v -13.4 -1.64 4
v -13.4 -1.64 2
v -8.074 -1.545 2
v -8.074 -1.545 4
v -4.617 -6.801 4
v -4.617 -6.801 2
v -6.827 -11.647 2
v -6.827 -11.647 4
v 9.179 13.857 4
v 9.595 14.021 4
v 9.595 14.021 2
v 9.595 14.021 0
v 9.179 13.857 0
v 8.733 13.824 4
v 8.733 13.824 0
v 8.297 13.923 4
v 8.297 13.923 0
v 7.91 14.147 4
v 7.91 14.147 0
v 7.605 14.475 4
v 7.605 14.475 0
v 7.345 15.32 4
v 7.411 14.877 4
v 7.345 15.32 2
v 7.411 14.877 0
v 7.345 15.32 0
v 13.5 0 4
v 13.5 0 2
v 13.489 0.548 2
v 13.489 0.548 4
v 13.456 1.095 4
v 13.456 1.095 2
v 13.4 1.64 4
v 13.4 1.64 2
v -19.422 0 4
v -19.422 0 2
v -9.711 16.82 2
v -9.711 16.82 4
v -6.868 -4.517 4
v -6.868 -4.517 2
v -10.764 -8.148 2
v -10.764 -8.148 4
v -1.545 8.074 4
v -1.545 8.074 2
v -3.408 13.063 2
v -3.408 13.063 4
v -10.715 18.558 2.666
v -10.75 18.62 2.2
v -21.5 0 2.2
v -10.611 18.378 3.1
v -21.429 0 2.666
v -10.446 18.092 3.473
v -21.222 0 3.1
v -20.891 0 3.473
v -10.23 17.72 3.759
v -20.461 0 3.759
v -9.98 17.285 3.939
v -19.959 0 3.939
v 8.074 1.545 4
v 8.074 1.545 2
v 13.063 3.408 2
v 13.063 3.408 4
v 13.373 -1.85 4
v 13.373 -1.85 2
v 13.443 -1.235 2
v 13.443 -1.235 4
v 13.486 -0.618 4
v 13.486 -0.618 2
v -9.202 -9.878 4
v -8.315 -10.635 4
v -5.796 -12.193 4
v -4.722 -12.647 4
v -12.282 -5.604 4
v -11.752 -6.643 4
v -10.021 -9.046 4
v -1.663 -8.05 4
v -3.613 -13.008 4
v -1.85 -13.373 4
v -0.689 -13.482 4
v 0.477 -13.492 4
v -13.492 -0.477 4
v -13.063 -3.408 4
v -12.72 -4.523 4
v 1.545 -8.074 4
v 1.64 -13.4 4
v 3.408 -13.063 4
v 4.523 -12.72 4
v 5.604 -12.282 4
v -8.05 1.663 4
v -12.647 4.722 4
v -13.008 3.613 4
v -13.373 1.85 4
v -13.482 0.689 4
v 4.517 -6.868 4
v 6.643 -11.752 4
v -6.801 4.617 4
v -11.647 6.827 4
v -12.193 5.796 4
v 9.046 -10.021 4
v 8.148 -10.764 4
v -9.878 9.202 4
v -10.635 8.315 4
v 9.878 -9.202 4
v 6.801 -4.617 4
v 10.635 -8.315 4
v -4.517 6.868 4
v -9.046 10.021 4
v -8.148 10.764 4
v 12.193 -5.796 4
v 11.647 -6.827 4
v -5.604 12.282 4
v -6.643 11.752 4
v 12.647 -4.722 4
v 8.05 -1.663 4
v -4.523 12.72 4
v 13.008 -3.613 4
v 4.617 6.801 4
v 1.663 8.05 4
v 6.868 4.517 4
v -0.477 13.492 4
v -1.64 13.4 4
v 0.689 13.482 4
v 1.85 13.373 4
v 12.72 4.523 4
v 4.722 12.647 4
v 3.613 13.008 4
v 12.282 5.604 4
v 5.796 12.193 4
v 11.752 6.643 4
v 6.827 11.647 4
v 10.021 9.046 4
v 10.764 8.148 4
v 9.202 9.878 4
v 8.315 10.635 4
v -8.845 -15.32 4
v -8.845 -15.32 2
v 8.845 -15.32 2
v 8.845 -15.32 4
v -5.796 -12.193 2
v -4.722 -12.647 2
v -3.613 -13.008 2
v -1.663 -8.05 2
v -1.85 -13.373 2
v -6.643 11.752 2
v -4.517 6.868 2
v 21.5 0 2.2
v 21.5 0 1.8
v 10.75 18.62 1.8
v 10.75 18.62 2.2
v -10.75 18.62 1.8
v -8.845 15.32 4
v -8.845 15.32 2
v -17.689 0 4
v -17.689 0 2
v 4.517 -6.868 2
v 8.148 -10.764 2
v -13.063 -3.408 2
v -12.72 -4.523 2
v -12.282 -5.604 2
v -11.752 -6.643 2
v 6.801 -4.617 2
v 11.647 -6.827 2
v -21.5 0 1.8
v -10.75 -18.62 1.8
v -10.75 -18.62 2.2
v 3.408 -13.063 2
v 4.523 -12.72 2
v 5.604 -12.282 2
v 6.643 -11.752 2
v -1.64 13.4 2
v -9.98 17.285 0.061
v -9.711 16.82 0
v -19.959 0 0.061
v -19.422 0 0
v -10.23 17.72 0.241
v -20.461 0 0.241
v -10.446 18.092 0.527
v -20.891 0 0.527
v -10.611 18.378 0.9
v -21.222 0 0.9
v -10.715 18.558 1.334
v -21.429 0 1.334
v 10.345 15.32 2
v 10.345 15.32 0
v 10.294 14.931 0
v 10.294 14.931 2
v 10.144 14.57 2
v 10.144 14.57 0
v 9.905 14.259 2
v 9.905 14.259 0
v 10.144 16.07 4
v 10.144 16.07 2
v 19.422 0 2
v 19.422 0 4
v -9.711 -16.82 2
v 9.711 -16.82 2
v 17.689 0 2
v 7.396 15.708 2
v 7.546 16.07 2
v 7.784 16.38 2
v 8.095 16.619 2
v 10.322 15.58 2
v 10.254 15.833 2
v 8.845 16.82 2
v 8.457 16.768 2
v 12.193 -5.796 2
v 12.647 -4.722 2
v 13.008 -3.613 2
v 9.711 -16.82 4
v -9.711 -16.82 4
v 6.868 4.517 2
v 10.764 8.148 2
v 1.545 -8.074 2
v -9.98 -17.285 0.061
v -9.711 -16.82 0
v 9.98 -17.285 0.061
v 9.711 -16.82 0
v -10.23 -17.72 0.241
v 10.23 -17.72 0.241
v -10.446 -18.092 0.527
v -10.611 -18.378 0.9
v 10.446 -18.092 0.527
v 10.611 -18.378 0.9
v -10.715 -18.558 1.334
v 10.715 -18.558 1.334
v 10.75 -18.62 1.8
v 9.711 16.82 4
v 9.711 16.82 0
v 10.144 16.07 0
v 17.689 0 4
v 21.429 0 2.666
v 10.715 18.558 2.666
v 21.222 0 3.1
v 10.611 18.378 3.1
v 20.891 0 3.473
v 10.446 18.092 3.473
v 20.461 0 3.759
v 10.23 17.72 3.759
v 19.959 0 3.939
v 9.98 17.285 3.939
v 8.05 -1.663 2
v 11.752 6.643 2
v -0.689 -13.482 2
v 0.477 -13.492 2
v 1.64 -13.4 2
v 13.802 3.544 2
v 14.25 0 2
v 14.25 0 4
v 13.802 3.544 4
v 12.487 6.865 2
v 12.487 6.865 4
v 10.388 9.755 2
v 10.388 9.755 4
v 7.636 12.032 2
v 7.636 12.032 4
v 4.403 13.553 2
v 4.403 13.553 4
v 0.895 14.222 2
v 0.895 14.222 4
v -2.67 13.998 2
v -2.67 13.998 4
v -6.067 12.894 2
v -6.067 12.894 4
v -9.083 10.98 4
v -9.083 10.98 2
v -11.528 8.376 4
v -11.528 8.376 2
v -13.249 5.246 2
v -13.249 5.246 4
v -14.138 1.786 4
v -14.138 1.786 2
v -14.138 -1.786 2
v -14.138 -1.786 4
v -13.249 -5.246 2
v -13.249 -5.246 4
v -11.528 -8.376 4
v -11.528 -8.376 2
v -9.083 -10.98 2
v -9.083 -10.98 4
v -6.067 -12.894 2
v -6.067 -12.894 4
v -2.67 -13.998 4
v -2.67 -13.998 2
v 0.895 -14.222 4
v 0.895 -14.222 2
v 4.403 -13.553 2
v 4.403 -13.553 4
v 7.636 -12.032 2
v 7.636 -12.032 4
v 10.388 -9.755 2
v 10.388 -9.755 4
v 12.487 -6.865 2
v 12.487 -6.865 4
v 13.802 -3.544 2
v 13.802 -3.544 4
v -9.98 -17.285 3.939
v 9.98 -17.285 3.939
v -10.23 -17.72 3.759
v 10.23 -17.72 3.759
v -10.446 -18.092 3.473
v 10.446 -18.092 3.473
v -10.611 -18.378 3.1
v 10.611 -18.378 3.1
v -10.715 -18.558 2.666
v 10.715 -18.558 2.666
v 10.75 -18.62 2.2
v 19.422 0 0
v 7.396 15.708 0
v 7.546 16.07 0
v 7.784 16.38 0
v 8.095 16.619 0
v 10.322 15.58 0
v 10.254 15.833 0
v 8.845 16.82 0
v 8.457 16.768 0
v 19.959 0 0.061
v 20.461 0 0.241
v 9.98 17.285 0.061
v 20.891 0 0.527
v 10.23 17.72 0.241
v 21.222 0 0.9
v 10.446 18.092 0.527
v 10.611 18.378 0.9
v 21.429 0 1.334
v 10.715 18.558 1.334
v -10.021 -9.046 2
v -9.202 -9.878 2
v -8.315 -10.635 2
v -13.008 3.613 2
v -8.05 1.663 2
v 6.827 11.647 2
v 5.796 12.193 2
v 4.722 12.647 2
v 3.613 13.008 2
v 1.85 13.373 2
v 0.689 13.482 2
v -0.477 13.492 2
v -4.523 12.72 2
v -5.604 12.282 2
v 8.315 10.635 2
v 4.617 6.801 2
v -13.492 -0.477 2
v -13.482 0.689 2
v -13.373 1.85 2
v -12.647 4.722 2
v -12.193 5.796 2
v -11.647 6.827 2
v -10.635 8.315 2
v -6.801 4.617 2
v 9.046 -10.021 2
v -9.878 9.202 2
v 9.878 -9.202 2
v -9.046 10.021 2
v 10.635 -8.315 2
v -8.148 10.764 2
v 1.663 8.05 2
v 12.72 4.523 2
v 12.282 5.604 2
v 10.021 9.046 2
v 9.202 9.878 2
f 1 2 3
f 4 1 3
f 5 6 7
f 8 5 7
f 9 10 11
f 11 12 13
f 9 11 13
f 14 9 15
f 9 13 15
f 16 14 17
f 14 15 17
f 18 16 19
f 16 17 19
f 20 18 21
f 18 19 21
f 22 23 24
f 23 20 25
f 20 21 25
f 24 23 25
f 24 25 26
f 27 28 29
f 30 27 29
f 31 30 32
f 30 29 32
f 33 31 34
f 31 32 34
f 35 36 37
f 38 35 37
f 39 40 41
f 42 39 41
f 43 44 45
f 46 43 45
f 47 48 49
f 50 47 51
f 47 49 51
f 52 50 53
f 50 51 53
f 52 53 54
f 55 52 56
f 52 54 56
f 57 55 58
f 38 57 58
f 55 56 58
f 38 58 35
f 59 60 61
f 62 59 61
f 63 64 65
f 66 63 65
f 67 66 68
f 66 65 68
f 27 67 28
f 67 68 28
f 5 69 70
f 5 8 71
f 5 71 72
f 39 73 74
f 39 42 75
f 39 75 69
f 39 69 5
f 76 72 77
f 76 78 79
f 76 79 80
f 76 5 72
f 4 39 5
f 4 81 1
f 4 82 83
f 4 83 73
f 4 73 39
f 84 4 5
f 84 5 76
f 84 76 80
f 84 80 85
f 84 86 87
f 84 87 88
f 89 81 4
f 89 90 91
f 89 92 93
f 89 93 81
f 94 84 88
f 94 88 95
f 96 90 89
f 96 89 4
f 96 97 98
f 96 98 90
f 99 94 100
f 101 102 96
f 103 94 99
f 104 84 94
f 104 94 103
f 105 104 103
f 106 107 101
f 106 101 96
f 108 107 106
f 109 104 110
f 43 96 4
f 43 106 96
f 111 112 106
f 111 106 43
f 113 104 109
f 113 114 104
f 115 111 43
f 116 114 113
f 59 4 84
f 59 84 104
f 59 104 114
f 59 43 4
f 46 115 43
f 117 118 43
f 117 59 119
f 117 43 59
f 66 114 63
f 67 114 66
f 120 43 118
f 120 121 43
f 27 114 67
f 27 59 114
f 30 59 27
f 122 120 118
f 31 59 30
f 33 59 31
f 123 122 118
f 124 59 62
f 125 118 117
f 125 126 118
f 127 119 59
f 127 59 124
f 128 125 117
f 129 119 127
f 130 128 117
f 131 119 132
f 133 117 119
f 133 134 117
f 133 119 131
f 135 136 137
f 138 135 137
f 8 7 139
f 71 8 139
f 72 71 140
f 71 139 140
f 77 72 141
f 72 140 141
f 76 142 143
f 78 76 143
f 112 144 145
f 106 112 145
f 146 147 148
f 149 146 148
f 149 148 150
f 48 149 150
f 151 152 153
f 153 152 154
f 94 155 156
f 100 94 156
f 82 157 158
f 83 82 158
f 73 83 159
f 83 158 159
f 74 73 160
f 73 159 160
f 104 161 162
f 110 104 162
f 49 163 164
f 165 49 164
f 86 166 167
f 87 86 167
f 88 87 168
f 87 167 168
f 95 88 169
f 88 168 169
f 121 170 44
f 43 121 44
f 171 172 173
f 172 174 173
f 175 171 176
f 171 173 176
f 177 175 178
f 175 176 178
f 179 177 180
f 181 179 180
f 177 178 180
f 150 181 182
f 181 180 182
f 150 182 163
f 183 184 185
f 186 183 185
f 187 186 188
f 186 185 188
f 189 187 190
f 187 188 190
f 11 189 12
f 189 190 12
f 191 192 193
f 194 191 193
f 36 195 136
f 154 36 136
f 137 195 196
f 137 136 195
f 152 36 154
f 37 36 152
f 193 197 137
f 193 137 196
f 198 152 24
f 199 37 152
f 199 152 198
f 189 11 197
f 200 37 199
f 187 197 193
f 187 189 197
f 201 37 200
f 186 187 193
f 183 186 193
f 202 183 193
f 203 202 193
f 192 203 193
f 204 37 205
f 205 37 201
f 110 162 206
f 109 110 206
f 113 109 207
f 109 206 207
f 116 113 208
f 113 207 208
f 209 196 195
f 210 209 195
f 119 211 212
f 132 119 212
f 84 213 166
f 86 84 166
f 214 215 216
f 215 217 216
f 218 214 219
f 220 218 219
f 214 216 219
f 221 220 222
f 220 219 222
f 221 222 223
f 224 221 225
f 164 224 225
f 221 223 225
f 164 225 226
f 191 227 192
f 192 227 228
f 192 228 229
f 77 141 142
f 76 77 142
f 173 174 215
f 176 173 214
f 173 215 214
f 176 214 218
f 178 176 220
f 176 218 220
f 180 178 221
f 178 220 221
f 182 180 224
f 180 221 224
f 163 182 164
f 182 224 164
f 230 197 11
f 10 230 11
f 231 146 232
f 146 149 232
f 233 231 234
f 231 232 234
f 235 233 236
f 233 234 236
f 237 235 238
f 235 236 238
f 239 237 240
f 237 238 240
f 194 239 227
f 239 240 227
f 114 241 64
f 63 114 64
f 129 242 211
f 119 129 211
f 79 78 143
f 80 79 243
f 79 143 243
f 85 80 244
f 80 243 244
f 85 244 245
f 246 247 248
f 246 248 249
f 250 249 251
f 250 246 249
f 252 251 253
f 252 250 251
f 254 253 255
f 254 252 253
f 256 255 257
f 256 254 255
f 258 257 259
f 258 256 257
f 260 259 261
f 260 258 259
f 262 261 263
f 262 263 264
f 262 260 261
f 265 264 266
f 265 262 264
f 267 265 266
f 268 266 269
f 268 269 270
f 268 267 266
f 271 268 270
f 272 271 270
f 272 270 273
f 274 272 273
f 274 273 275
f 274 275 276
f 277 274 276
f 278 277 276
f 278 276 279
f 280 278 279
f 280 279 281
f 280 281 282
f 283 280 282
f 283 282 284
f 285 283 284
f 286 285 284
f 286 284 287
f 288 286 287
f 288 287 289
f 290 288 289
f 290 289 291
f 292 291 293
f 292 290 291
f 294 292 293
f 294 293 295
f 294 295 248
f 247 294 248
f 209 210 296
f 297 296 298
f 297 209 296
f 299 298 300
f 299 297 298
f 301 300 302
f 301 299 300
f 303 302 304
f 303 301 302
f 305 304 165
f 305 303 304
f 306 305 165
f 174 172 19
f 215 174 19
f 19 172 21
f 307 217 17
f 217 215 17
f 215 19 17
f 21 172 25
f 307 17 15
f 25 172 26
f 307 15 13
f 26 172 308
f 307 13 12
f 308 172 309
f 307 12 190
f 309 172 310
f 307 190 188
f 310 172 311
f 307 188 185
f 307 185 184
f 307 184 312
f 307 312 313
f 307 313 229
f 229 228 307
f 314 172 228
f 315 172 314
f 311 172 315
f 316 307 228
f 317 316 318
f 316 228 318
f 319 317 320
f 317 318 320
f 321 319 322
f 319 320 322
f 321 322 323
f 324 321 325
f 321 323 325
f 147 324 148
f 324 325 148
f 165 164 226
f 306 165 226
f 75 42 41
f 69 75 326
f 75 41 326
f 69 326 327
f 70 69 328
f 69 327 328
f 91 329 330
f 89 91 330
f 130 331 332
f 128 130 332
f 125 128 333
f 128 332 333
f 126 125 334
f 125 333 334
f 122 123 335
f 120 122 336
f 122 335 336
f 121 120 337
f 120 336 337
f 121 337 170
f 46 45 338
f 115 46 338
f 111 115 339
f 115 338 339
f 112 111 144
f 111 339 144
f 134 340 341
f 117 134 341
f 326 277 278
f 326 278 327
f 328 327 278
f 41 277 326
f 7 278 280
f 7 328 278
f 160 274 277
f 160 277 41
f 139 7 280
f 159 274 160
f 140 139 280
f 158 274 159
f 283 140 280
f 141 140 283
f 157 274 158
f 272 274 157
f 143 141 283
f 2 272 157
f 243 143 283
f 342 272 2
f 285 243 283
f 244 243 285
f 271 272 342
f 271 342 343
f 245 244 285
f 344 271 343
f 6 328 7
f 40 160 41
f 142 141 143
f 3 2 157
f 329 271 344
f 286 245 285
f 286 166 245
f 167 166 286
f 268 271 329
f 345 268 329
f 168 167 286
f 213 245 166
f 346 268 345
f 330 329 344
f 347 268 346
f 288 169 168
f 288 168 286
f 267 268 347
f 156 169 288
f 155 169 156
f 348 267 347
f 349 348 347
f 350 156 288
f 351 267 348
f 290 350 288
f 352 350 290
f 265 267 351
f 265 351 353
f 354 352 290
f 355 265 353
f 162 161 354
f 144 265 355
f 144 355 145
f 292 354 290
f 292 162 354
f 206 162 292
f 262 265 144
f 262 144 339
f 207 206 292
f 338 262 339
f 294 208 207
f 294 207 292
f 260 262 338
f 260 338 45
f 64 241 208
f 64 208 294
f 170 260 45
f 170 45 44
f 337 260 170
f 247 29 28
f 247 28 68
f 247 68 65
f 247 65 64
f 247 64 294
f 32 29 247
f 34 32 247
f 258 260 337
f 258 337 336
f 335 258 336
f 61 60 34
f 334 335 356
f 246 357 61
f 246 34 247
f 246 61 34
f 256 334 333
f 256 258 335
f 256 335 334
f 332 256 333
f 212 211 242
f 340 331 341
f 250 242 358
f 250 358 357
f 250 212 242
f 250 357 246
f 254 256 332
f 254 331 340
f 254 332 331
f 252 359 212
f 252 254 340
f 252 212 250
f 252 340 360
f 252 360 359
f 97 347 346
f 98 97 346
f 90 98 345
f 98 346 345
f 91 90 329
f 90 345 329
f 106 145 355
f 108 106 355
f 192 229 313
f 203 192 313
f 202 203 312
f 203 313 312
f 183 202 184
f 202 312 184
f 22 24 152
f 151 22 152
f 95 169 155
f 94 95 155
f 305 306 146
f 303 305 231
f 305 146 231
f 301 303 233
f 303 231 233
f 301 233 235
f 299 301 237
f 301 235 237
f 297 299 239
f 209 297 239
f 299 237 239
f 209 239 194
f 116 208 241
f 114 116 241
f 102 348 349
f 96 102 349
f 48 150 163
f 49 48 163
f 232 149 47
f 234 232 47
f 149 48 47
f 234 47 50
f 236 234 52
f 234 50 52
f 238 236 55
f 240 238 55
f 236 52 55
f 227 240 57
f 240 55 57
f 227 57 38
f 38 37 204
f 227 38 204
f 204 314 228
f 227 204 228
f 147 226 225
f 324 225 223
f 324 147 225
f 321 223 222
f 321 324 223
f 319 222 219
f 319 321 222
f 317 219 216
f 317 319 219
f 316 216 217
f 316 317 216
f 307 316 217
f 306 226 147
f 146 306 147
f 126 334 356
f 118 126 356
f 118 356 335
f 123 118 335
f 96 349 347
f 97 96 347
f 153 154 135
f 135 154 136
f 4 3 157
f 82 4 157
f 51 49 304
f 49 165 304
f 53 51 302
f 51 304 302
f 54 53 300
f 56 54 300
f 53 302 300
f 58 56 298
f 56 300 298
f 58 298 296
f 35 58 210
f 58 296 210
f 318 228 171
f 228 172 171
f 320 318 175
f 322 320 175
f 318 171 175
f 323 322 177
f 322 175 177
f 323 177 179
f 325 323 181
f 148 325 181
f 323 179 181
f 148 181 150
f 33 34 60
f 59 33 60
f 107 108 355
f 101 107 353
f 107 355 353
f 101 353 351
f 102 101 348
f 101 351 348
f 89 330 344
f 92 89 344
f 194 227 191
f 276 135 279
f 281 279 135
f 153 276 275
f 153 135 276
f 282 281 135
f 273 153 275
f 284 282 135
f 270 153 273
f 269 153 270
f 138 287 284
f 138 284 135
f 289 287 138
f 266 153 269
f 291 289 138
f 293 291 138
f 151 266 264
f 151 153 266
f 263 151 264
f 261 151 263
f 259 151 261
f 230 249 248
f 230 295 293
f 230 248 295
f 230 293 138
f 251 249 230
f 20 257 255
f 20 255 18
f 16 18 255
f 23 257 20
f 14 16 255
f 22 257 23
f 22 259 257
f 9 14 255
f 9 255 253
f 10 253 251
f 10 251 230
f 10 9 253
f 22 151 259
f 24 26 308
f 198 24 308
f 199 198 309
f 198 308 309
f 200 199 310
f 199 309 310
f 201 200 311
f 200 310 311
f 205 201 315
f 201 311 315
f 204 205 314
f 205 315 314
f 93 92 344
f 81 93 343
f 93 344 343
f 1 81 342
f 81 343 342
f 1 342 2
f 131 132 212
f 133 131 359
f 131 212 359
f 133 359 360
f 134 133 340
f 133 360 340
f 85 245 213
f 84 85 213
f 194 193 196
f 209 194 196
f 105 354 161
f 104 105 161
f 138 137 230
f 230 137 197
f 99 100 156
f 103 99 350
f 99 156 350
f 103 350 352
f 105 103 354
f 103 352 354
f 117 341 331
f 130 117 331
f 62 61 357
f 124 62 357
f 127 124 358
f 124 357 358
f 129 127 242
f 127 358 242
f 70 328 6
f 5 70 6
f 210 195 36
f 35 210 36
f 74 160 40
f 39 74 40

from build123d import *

# Parameters (mm, degrees)
F0_R     = 14.25
F1_DEPTH = 2
F2_DEPTH = 4
F3_R     = 1.79999


# Not quite as in the source:
# - a fillet or chamfer is up to 0.001 mm smaller than in the source, because OpenCascade refuses the exact size


with BuildPart() as f1:
    # F0 (on Top) → F1 (new body)
    with BuildSketch(Plane.XY):
        Polygon((10.75, -18.6195461814), (21.5, 0), (10.75, 18.6195461814), (-10.75, 18.6195461814), (-21.5, 0), (-10.75, -18.6195461814), align=None)
        Polygon((-19.4215390309, 0), (-9.7107695155, 16.8195461814), (8.8447441387, 16.8195461814), (9.7107695155, 16.8195461814), (10.1437822383, 16.069546145), (19.4215390309, 0), (9.7107695155, -16.8195461814), (-9.7107695155, -16.8195461814), align=None, mode=Mode.SUBTRACT)
        with BuildLine():
            ThreePointArc((9.5947441117, 14.0205080757), (8.0947441117, 14.0205080757), (7.3447441117, 15.3195461814))
            Line((7.3447441117, 15.3195461814), (-8.8447441117, 15.3195461814))
            Line((-8.8447441117, 15.3195461814), (-17.6894882233, 0))
            Line((-17.6894882233, 0), (-8.8447441117, -15.3195461814))
            Line((-8.8447441117, -15.3195461814), (8.8447441117, -15.3195461814))
            Line((8.8447441117, -15.3195461814), (17.6894882233, 0))
            Line((17.6894882233, 0), (9.5947441117, 14.0205080757))
        make_face()
        Circle(F0_R, mode=Mode.SUBTRACT)
        Circle(F0_R)
        with BuildLine():
            ThreePointArc((13.3999904986, 1.6401995725), (13.4749744291, 0.8216228664), (13.5, 0))
            ThreePointArc((13.5, 0), (13.4681223582, -0.9271893786), (13.3726399787, -1.85))
            ThreePointArc((13.3726399787, -1.85), (13.2195565752, -2.7373936427), (13.0076541597, -3.6126075434))
            ThreePointArc((13.0076541597, -3.6126075434), (12.4315074952, -5.2638029406), (11.6467440221, -6.826664902))
            ThreePointArc((11.6467440221, -6.826664902), (11.1657225538, -7.5879272435), (10.6350203896, -8.3154279091))
            ThreePointArc((10.6350203896, -8.3154279091), (9.4708451564, -9.6204517577), (8.1477368661, -10.7640319565))
            ThreePointArc((8.1477368661, -10.7640319565), (7.4120084911, -11.2832677061), (6.643301172, -11.7522997553))
            ThreePointArc((6.643301172, -11.7522997553), (5.0683324961, -12.5124740043), (3.4083106317, -13.0626727218))
            ThreePointArc((3.4083106317, -13.0626727218), (2.5298833256, -13.2608329436), (1.6401995725, -13.3999904986))
            ThreePointArc((1.6401995725, -13.3999904986), (-0.1057878423, -13.4995855097), (-1.85, -13.3726399787))
            ThreePointArc((-1.85, -13.3726399787), (-2.7373936427, -13.2195565752), (-3.6126075434, -13.0076541597))
            ThreePointArc((-3.6126075434, -13.0076541597), (-5.2638029406, -12.4315074952), (-6.826664902, -11.6467440221))
            ThreePointArc((-6.826664902, -11.6467440221), (-7.5879272435, -11.1657225538), (-8.3154279091, -10.6350203896))
            ThreePointArc((-8.3154279091, -10.6350203896), (-9.6204517577, -9.4708451564), (-10.7640319565, -8.1477368661))
            ThreePointArc((-10.7640319565, -8.1477368661), (-11.2832677061, -7.4120084911), (-11.7522997553, -6.643301172))
            ThreePointArc((-11.7522997553, -6.643301172), (-12.5124740043, -5.0683324961), (-13.0626727218, -3.4083106317))
            ThreePointArc((-13.0626727218, -3.4083106317), (-13.2608329436, -2.5298833256), (-13.3999904986, -1.6401995725))
            ThreePointArc((-13.3999904986, -1.6401995725), (-13.4995855097, 0.1057878423), (-13.3726399787, 1.85))
            ThreePointArc((-13.3726399787, 1.85), (-13.2195565752, 2.7373936427), (-13.0076541597, 3.6126075434))
            ThreePointArc((-13.0076541597, 3.6126075434), (-12.4315074952, 5.2638029406), (-11.6467440221, 6.826664902))
            ThreePointArc((-11.6467440221, 6.826664902), (-11.1657225538, 7.5879272435), (-10.6350203896, 8.3154279091))
            ThreePointArc((-10.6350203896, 8.3154279091), (-9.4708451564, 9.6204517577), (-8.1477368661, 10.7640319565))
            ThreePointArc((-8.1477368661, 10.7640319565), (-7.4120084911, 11.2832677061), (-6.643301172, 11.7522997553))
            ThreePointArc((-6.643301172, 11.7522997553), (-5.0683324961, 12.5124740043), (-3.4083106317, 13.0626727218))
            ThreePointArc((-3.4083106317, 13.0626727218), (-2.5298833256, 13.2608329436), (-1.6401995725, 13.3999904986))
            ThreePointArc((-1.6401995725, 13.3999904986), (0.1057878423, 13.4995855097), (1.85, 13.3726399787))
            ThreePointArc((1.85, 13.3726399787), (2.7373936427, 13.2195565752), (3.6126075434, 13.0076541597))
            ThreePointArc((3.6126075434, 13.0076541597), (5.2638029406, 12.4315074952), (6.826664902, 11.6467440221))
            ThreePointArc((6.826664902, 11.6467440221), (7.5879272435, 11.1657225538), (8.3154279091, 10.6350203896))
            ThreePointArc((8.3154279091, 10.6350203896), (9.6204517577, 9.4708451564), (10.7640319565, 8.1477368661))
            ThreePointArc((10.7640319565, 8.1477368661), (11.2832677061, 7.4120084911), (11.7522997553, 6.643301172))
            ThreePointArc((11.7522997553, 6.643301172), (12.5124740043, 5.0683324961), (13.0626727218, 3.4083106317))
            ThreePointArc((13.0626727218, 3.4083106317), (13.2608329436, 2.5298833256), (13.3999904986, 1.6401995725))
        make_face(mode=Mode.SUBTRACT)
        with BuildLine():
            ThreePointArc((13.3726399787, -1.85), (13.4681223582, -0.9271893786), (13.5, 0))
            ThreePointArc((13.5, 0), (13.4749744291, 0.8216228664), (13.3999904986, 1.6401995725))
            Line((13.3999904986, 1.6401995725), (8.0735512703, 1.5445602693))
            Line((8.0735512703, 1.5445602693), (13.0626727218, 3.4083106317))
            ThreePointArc((13.0626727218, 3.4083106317), (12.5124740043, 5.0683324961), (11.7522997553, 6.643301172))
            Line((11.7522997553, 6.643301172), (6.867911148, 4.5166019311))
            Line((6.867911148, 4.5166019311), (10.7640319565, 8.1477368661))
            ThreePointArc((10.7640319565, 8.1477368661), (9.6204517577, 9.4708451564), (8.3154279091, 10.6350203896))
            Line((8.3154279091, 10.6350203896), (4.6166938111, 6.8010318919))
            Line((4.6166938111, 6.8010318919), (6.826664902, 11.6467440221))
            ThreePointArc((6.826664902, 11.6467440221), (5.2638029406, 12.4315074952), (3.6126075434, 13.0076541597))
            Line((3.6126075434, 13.0076541597), (1.6626266919, 8.0500663987))
            Line((1.6626266919, 8.0500663987), (1.85, 13.3726399787))
            ThreePointArc((1.85, 13.3726399787), (0.1057878423, 13.4995855097), (-1.6401995725, 13.3999904986))
            Line((-1.6401995725, 13.3999904986), (-1.5445602693, 8.0735512703))
            Line((-1.5445602693, 8.0735512703), (-3.4083106317, 13.0626727218))
            ThreePointArc((-3.4083106317, 13.0626727218), (-5.0683324961, 12.5124740043), (-6.643301172, 11.7522997553))
            Line((-6.643301172, 11.7522997553), (-4.5166019311, 6.867911148))
            Line((-4.5166019311, 6.867911148), (-8.1477368661, 10.7640319565))
            ThreePointArc((-8.1477368661, 10.7640319565), (-9.4708451564, 9.6204517577), (-10.6350203896, 8.3154279091))
            Line((-10.6350203896, 8.3154279091), (-6.8010318919, 4.6166938111))
            Line((-6.8010318919, 4.6166938111), (-11.6467440221, 6.826664902))
            ThreePointArc((-11.6467440221, 6.826664902), (-12.4315074952, 5.2638029406), (-13.0076541597, 3.6126075434))
            Line((-13.0076541597, 3.6126075434), (-8.0500663987, 1.6626266919))
            Line((-8.0500663987, 1.6626266919), (-13.3726399787, 1.85))
            ThreePointArc((-13.3726399787, 1.85), (-13.4995855097, 0.1057878423), (-13.3999904986, -1.6401995725))
            Line((-13.3999904986, -1.6401995725), (-8.0735512703, -1.5445602693))
            Line((-8.0735512703, -1.5445602693), (-13.0626727218, -3.4083106317))
            ThreePointArc((-13.0626727218, -3.4083106317), (-12.5124740043, -5.0683324961), (-11.7522997553, -6.643301172))
            Line((-11.7522997553, -6.643301172), (-6.867911148, -4.5166019311))
            Line((-6.867911148, -4.5166019311), (-10.7640319565, -8.1477368661))
            ThreePointArc((-10.7640319565, -8.1477368661), (-9.6204517577, -9.4708451564), (-8.3154279091, -10.6350203896))
            Line((-8.3154279091, -10.6350203896), (-4.6166938111, -6.8010318919))
            Line((-4.6166938111, -6.8010318919), (-6.826664902, -11.6467440221))
            ThreePointArc((-6.826664902, -11.6467440221), (-5.2638029406, -12.4315074952), (-3.6126075434, -13.0076541597))
            Line((-3.6126075434, -13.0076541597), (-1.6626266919, -8.0500663987))
            Line((-1.6626266919, -8.0500663987), (-1.85, -13.3726399787))
            ThreePointArc((-1.85, -13.3726399787), (-0.1057878423, -13.4995855097), (1.6401995725, -13.3999904986))
            Line((1.6401995725, -13.3999904986), (1.5445602693, -8.0735512703))
            Line((1.5445602693, -8.0735512703), (3.4083106317, -13.0626727218))
            ThreePointArc((3.4083106317, -13.0626727218), (5.0683324961, -12.5124740043), (6.643301172, -11.7522997553))
            Line((6.643301172, -11.7522997553), (4.5166019311, -6.867911148))
            Line((4.5166019311, -6.867911148), (8.1477368661, -10.7640319565))
            ThreePointArc((8.1477368661, -10.7640319565), (9.4708451564, -9.6204517577), (10.6350203896, -8.3154279091))
            Line((10.6350203896, -8.3154279091), (6.8010318919, -4.6166938111))
            Line((6.8010318919, -4.6166938111), (11.6467440221, -6.826664902))
            ThreePointArc((11.6467440221, -6.826664902), (12.4315074952, -5.2638029406), (13.0076541597, -3.6126075434))
            Line((13.0076541597, -3.6126075434), (8.0500663987, -1.6626266919))
            Line((8.0500663987, -1.6626266919), (13.3726399787, -1.85))
        make_face()
        with BuildLine():
            Line((8.8447441387, 16.8195461814), (-9.7107695155, 16.8195461814))
            Line((-9.7107695155, 16.8195461814), (-19.4215390309, 0))
            Line((-19.4215390309, 0), (-9.7107695155, -16.8195461814))
            Line((-9.7107695155, -16.8195461814), (9.7107695155, -16.8195461814))
            Line((9.7107695155, -16.8195461814), (19.4215390309, 0))
            Line((19.4215390309, 0), (10.1437822383, 16.069546145))
            ThreePointArc((10.1437822383, 16.069546145), (10.2936328565, 15.7077747288), (10.3447441117, 15.3195461814))
            ThreePointArc((10.3447441117, 15.3195461814), (10.1437822174, 14.5695461814), (9.5947441117, 14.0205080757))
            Line((9.5947441117, 14.0205080757), (17.6894882233, 0))
            Line((17.6894882233, 0), (8.8447441117, -15.3195461814))
            Line((8.8447441117, -15.3195461814), (-8.8447441117, -15.3195461814))
            Line((-8.8447441117, -15.3195461814), (-17.6894882233, 0))
            Line((-17.6894882233, 0), (-8.8447441117, 15.3195461814))
            Line((-8.8447441117, 15.3195461814), (7.3447441117, 15.3195461814))
            ThreePointArc((7.3447441117, 15.3195461814), (7.7840839495, 16.3802063627), (8.8447441387, 16.8195461814))
        make_face()
        with BuildLine():
            ThreePointArc((-11.7522997553, -6.643301172), (-11.2832677061, -7.4120084911), (-10.7640319565, -8.1477368661))
            Line((-10.7640319565, -8.1477368661), (-6.867911148, -4.5166019311))
            Line((-6.867911148, -4.5166019311), (-11.7522997553, -6.643301172))
        make_face()
        with BuildLine():
            ThreePointArc((-8.3154279091, -10.6350203896), (-7.5879272435, -11.1657225538), (-6.826664902, -11.6467440221))
            Line((-6.826664902, -11.6467440221), (-4.6166938111, -6.8010318919))
            Line((-4.6166938111, -6.8010318919), (-8.3154279091, -10.6350203896))
        make_face()
        with BuildLine():
            ThreePointArc((-3.6126075434, -13.0076541597), (-2.7373936427, -13.2195565752), (-1.85, -13.3726399787))
            Line((-1.85, -13.3726399787), (-1.6626266919, -8.0500663987))
            Line((-1.6626266919, -8.0500663987), (-3.6126075434, -13.0076541597))
        make_face()
        with BuildLine():
            ThreePointArc((1.6401995725, -13.3999904986), (2.5298833256, -13.2608329436), (3.4083106317, -13.0626727218))
            Line((3.4083106317, -13.0626727218), (1.5445602693, -8.0735512703))
            Line((1.5445602693, -8.0735512703), (1.6401995725, -13.3999904986))
        make_face()
        with BuildLine():
            ThreePointArc((6.643301172, -11.7522997553), (7.4120084911, -11.2832677061), (8.1477368661, -10.7640319565))
            Line((8.1477368661, -10.7640319565), (4.5166019311, -6.867911148))
            Line((4.5166019311, -6.867911148), (6.643301172, -11.7522997553))
        make_face()
        with BuildLine():
            ThreePointArc((10.6350203896, -8.3154279091), (11.1657225538, -7.5879272435), (11.6467440221, -6.826664902))
            Line((11.6467440221, -6.826664902), (6.8010318919, -4.6166938111))
            Line((6.8010318919, -4.6166938111), (10.6350203896, -8.3154279091))
        make_face()
        with BuildLine():
            ThreePointArc((13.0076541597, -3.6126075434), (13.2195565752, -2.7373936427), (13.3726399787, -1.85))
            Line((13.3726399787, -1.85), (8.0500663987, -1.6626266919))
            Line((8.0500663987, -1.6626266919), (13.0076541597, -3.6126075434))
        make_face()
        with BuildLine():
            Line((8.0735512703, 1.5445602693), (13.3999904986, 1.6401995725))
            ThreePointArc((13.3999904986, 1.6401995725), (13.2608329436, 2.5298833256), (13.0626727218, 3.4083106317))
            Line((13.0626727218, 3.4083106317), (8.0735512703, 1.5445602693))
        make_face()
        with BuildLine():
            Line((6.867911148, 4.5166019311), (11.7522997553, 6.643301172))
            ThreePointArc((11.7522997553, 6.643301172), (11.2832677061, 7.4120084911), (10.7640319565, 8.1477368661))
            Line((10.7640319565, 8.1477368661), (6.867911148, 4.5166019311))
        make_face()
        with BuildLine():
            Line((4.6166938111, 6.8010318919), (8.3154279091, 10.6350203896))
            ThreePointArc((8.3154279091, 10.6350203896), (7.5879272435, 11.1657225538), (6.826664902, 11.6467440221))
            Line((6.826664902, 11.6467440221), (4.6166938111, 6.8010318919))
        make_face()
        with BuildLine():
            Line((1.6626266919, 8.0500663987), (3.6126075434, 13.0076541597))
            ThreePointArc((3.6126075434, 13.0076541597), (2.7373936427, 13.2195565752), (1.85, 13.3726399787))
            Line((1.85, 13.3726399787), (1.6626266919, 8.0500663987))
        make_face()
        with BuildLine():
            Line((-1.5445602693, 8.0735512703), (-1.6401995725, 13.3999904986))
            ThreePointArc((-1.6401995725, 13.3999904986), (-2.5298833256, 13.2608329436), (-3.4083106317, 13.0626727218))
            Line((-3.4083106317, 13.0626727218), (-1.5445602693, 8.0735512703))
        make_face()
        with BuildLine():
            Line((-4.5166019311, 6.867911148), (-6.643301172, 11.7522997553))
            ThreePointArc((-6.643301172, 11.7522997553), (-7.4120084911, 11.2832677061), (-8.1477368661, 10.7640319565))
            Line((-8.1477368661, 10.7640319565), (-4.5166019311, 6.867911148))
        make_face()
        with BuildLine():
            Line((-6.8010318919, 4.6166938111), (-10.6350203896, 8.3154279091))
            ThreePointArc((-10.6350203896, 8.3154279091), (-11.1657225538, 7.5879272435), (-11.6467440221, 6.826664902))
            Line((-11.6467440221, 6.826664902), (-6.8010318919, 4.6166938111))
        make_face()
        with BuildLine():
            Line((-8.0500663987, 1.6626266919), (-13.0076541597, 3.6126075434))
            ThreePointArc((-13.0076541597, 3.6126075434), (-13.2195565752, 2.7373936427), (-13.3726399787, 1.85))
            Line((-13.3726399787, 1.85), (-8.0500663987, 1.6626266919))
        make_face()
        with BuildLine():
            ThreePointArc((-13.3999904986, -1.6401995725), (-13.2608329436, -2.5298833256), (-13.0626727218, -3.4083106317))
            Line((-13.0626727218, -3.4083106317), (-8.0735512703, -1.5445602693))
            Line((-8.0735512703, -1.5445602693), (-13.3999904986, -1.6401995725))
        make_face()
    extrude(amount=F1_DEPTH)

    # F0 (on Top) → F2 (join)
    with BuildSketch(Plane.XY):
        Polygon((10.75, -18.6195461814), (21.5, 0), (10.75, 18.6195461814), (-10.75, 18.6195461814), (-21.5, 0), (-10.75, -18.6195461814), align=None)
        Polygon((-19.4215390309, 0), (-9.7107695155, 16.8195461814), (8.8447441387, 16.8195461814), (9.7107695155, 16.8195461814), (10.1437822383, 16.069546145), (19.4215390309, 0), (9.7107695155, -16.8195461814), (-9.7107695155, -16.8195461814), align=None, mode=Mode.SUBTRACT)
        with BuildLine():
            ThreePointArc((9.5947441117, 14.0205080757), (8.0947441117, 14.0205080757), (7.3447441117, 15.3195461814))
            Line((7.3447441117, 15.3195461814), (-8.8447441117, 15.3195461814))
            Line((-8.8447441117, 15.3195461814), (-17.6894882233, 0))
            Line((-17.6894882233, 0), (-8.8447441117, -15.3195461814))
            Line((-8.8447441117, -15.3195461814), (8.8447441117, -15.3195461814))
            Line((8.8447441117, -15.3195461814), (17.6894882233, 0))
            Line((17.6894882233, 0), (9.5947441117, 14.0205080757))
        make_face()
        Circle(F0_R, mode=Mode.SUBTRACT)
        with BuildLine():
            ThreePointArc((13.3726399787, -1.85), (13.4681223582, -0.9271893786), (13.5, 0))
            ThreePointArc((13.5, 0), (13.4749744291, 0.8216228664), (13.3999904986, 1.6401995725))
            Line((13.3999904986, 1.6401995725), (8.0735512703, 1.5445602693))
            Line((8.0735512703, 1.5445602693), (13.0626727218, 3.4083106317))
            ThreePointArc((13.0626727218, 3.4083106317), (12.5124740043, 5.0683324961), (11.7522997553, 6.643301172))
            Line((11.7522997553, 6.643301172), (6.867911148, 4.5166019311))
            Line((6.867911148, 4.5166019311), (10.7640319565, 8.1477368661))
            ThreePointArc((10.7640319565, 8.1477368661), (9.6204517577, 9.4708451564), (8.3154279091, 10.6350203896))
            Line((8.3154279091, 10.6350203896), (4.6166938111, 6.8010318919))
            Line((4.6166938111, 6.8010318919), (6.826664902, 11.6467440221))
            ThreePointArc((6.826664902, 11.6467440221), (5.2638029406, 12.4315074952), (3.6126075434, 13.0076541597))
            Line((3.6126075434, 13.0076541597), (1.6626266919, 8.0500663987))
            Line((1.6626266919, 8.0500663987), (1.85, 13.3726399787))
            ThreePointArc((1.85, 13.3726399787), (0.1057878423, 13.4995855097), (-1.6401995725, 13.3999904986))
            Line((-1.6401995725, 13.3999904986), (-1.5445602693, 8.0735512703))
            Line((-1.5445602693, 8.0735512703), (-3.4083106317, 13.0626727218))
            ThreePointArc((-3.4083106317, 13.0626727218), (-5.0683324961, 12.5124740043), (-6.643301172, 11.7522997553))
            Line((-6.643301172, 11.7522997553), (-4.5166019311, 6.867911148))
            Line((-4.5166019311, 6.867911148), (-8.1477368661, 10.7640319565))
            ThreePointArc((-8.1477368661, 10.7640319565), (-9.4708451564, 9.6204517577), (-10.6350203896, 8.3154279091))
            Line((-10.6350203896, 8.3154279091), (-6.8010318919, 4.6166938111))
            Line((-6.8010318919, 4.6166938111), (-11.6467440221, 6.826664902))
            ThreePointArc((-11.6467440221, 6.826664902), (-12.4315074952, 5.2638029406), (-13.0076541597, 3.6126075434))
            Line((-13.0076541597, 3.6126075434), (-8.0500663987, 1.6626266919))
            Line((-8.0500663987, 1.6626266919), (-13.3726399787, 1.85))
            ThreePointArc((-13.3726399787, 1.85), (-13.4995855097, 0.1057878423), (-13.3999904986, -1.6401995725))
            Line((-13.3999904986, -1.6401995725), (-8.0735512703, -1.5445602693))
            Line((-8.0735512703, -1.5445602693), (-13.0626727218, -3.4083106317))
            ThreePointArc((-13.0626727218, -3.4083106317), (-12.5124740043, -5.0683324961), (-11.7522997553, -6.643301172))
            Line((-11.7522997553, -6.643301172), (-6.867911148, -4.5166019311))
            Line((-6.867911148, -4.5166019311), (-10.7640319565, -8.1477368661))
            ThreePointArc((-10.7640319565, -8.1477368661), (-9.6204517577, -9.4708451564), (-8.3154279091, -10.6350203896))
            Line((-8.3154279091, -10.6350203896), (-4.6166938111, -6.8010318919))
            Line((-4.6166938111, -6.8010318919), (-6.826664902, -11.6467440221))
            ThreePointArc((-6.826664902, -11.6467440221), (-5.2638029406, -12.4315074952), (-3.6126075434, -13.0076541597))
            Line((-3.6126075434, -13.0076541597), (-1.6626266919, -8.0500663987))
            Line((-1.6626266919, -8.0500663987), (-1.85, -13.3726399787))
            ThreePointArc((-1.85, -13.3726399787), (-0.1057878423, -13.4995855097), (1.6401995725, -13.3999904986))
            Line((1.6401995725, -13.3999904986), (1.5445602693, -8.0735512703))
            Line((1.5445602693, -8.0735512703), (3.4083106317, -13.0626727218))
            ThreePointArc((3.4083106317, -13.0626727218), (5.0683324961, -12.5124740043), (6.643301172, -11.7522997553))
            Line((6.643301172, -11.7522997553), (4.5166019311, -6.867911148))
            Line((4.5166019311, -6.867911148), (8.1477368661, -10.7640319565))
            ThreePointArc((8.1477368661, -10.7640319565), (9.4708451564, -9.6204517577), (10.6350203896, -8.3154279091))
            Line((10.6350203896, -8.3154279091), (6.8010318919, -4.6166938111))
            Line((6.8010318919, -4.6166938111), (11.6467440221, -6.826664902))
            ThreePointArc((11.6467440221, -6.826664902), (12.4315074952, -5.2638029406), (13.0076541597, -3.6126075434))
            Line((13.0076541597, -3.6126075434), (8.0500663987, -1.6626266919))
            Line((8.0500663987, -1.6626266919), (13.3726399787, -1.85))
        make_face()
    extrude(amount=F2_DEPTH)

    # F3 (radius 1.8 in the source; OpenCascade refuses exactly that, so slightly less here)
    f3_edges = [f1.edges().sort_by_distance(p)[0] for p in [
        (-16.125, -9.309773, 4),
        (-16.125, 9.309773, 4),
        (0, 18.619546, 4),
        (16.125, 9.309773, 4),
        (16.125, -9.309773, 4),
        (0, -18.619546, 4),
        (16.125, -9.309773, 0),
        (0, -18.619546, 0),
        (16.125, 9.309773, 0),
        (0, 18.619546, 0),
        (-16.125, 9.309773, 0),
        (-16.125, -9.309773, 0),
    ]]
    fillet(f3_edges, radius=F3_R)


solid = f1.part
